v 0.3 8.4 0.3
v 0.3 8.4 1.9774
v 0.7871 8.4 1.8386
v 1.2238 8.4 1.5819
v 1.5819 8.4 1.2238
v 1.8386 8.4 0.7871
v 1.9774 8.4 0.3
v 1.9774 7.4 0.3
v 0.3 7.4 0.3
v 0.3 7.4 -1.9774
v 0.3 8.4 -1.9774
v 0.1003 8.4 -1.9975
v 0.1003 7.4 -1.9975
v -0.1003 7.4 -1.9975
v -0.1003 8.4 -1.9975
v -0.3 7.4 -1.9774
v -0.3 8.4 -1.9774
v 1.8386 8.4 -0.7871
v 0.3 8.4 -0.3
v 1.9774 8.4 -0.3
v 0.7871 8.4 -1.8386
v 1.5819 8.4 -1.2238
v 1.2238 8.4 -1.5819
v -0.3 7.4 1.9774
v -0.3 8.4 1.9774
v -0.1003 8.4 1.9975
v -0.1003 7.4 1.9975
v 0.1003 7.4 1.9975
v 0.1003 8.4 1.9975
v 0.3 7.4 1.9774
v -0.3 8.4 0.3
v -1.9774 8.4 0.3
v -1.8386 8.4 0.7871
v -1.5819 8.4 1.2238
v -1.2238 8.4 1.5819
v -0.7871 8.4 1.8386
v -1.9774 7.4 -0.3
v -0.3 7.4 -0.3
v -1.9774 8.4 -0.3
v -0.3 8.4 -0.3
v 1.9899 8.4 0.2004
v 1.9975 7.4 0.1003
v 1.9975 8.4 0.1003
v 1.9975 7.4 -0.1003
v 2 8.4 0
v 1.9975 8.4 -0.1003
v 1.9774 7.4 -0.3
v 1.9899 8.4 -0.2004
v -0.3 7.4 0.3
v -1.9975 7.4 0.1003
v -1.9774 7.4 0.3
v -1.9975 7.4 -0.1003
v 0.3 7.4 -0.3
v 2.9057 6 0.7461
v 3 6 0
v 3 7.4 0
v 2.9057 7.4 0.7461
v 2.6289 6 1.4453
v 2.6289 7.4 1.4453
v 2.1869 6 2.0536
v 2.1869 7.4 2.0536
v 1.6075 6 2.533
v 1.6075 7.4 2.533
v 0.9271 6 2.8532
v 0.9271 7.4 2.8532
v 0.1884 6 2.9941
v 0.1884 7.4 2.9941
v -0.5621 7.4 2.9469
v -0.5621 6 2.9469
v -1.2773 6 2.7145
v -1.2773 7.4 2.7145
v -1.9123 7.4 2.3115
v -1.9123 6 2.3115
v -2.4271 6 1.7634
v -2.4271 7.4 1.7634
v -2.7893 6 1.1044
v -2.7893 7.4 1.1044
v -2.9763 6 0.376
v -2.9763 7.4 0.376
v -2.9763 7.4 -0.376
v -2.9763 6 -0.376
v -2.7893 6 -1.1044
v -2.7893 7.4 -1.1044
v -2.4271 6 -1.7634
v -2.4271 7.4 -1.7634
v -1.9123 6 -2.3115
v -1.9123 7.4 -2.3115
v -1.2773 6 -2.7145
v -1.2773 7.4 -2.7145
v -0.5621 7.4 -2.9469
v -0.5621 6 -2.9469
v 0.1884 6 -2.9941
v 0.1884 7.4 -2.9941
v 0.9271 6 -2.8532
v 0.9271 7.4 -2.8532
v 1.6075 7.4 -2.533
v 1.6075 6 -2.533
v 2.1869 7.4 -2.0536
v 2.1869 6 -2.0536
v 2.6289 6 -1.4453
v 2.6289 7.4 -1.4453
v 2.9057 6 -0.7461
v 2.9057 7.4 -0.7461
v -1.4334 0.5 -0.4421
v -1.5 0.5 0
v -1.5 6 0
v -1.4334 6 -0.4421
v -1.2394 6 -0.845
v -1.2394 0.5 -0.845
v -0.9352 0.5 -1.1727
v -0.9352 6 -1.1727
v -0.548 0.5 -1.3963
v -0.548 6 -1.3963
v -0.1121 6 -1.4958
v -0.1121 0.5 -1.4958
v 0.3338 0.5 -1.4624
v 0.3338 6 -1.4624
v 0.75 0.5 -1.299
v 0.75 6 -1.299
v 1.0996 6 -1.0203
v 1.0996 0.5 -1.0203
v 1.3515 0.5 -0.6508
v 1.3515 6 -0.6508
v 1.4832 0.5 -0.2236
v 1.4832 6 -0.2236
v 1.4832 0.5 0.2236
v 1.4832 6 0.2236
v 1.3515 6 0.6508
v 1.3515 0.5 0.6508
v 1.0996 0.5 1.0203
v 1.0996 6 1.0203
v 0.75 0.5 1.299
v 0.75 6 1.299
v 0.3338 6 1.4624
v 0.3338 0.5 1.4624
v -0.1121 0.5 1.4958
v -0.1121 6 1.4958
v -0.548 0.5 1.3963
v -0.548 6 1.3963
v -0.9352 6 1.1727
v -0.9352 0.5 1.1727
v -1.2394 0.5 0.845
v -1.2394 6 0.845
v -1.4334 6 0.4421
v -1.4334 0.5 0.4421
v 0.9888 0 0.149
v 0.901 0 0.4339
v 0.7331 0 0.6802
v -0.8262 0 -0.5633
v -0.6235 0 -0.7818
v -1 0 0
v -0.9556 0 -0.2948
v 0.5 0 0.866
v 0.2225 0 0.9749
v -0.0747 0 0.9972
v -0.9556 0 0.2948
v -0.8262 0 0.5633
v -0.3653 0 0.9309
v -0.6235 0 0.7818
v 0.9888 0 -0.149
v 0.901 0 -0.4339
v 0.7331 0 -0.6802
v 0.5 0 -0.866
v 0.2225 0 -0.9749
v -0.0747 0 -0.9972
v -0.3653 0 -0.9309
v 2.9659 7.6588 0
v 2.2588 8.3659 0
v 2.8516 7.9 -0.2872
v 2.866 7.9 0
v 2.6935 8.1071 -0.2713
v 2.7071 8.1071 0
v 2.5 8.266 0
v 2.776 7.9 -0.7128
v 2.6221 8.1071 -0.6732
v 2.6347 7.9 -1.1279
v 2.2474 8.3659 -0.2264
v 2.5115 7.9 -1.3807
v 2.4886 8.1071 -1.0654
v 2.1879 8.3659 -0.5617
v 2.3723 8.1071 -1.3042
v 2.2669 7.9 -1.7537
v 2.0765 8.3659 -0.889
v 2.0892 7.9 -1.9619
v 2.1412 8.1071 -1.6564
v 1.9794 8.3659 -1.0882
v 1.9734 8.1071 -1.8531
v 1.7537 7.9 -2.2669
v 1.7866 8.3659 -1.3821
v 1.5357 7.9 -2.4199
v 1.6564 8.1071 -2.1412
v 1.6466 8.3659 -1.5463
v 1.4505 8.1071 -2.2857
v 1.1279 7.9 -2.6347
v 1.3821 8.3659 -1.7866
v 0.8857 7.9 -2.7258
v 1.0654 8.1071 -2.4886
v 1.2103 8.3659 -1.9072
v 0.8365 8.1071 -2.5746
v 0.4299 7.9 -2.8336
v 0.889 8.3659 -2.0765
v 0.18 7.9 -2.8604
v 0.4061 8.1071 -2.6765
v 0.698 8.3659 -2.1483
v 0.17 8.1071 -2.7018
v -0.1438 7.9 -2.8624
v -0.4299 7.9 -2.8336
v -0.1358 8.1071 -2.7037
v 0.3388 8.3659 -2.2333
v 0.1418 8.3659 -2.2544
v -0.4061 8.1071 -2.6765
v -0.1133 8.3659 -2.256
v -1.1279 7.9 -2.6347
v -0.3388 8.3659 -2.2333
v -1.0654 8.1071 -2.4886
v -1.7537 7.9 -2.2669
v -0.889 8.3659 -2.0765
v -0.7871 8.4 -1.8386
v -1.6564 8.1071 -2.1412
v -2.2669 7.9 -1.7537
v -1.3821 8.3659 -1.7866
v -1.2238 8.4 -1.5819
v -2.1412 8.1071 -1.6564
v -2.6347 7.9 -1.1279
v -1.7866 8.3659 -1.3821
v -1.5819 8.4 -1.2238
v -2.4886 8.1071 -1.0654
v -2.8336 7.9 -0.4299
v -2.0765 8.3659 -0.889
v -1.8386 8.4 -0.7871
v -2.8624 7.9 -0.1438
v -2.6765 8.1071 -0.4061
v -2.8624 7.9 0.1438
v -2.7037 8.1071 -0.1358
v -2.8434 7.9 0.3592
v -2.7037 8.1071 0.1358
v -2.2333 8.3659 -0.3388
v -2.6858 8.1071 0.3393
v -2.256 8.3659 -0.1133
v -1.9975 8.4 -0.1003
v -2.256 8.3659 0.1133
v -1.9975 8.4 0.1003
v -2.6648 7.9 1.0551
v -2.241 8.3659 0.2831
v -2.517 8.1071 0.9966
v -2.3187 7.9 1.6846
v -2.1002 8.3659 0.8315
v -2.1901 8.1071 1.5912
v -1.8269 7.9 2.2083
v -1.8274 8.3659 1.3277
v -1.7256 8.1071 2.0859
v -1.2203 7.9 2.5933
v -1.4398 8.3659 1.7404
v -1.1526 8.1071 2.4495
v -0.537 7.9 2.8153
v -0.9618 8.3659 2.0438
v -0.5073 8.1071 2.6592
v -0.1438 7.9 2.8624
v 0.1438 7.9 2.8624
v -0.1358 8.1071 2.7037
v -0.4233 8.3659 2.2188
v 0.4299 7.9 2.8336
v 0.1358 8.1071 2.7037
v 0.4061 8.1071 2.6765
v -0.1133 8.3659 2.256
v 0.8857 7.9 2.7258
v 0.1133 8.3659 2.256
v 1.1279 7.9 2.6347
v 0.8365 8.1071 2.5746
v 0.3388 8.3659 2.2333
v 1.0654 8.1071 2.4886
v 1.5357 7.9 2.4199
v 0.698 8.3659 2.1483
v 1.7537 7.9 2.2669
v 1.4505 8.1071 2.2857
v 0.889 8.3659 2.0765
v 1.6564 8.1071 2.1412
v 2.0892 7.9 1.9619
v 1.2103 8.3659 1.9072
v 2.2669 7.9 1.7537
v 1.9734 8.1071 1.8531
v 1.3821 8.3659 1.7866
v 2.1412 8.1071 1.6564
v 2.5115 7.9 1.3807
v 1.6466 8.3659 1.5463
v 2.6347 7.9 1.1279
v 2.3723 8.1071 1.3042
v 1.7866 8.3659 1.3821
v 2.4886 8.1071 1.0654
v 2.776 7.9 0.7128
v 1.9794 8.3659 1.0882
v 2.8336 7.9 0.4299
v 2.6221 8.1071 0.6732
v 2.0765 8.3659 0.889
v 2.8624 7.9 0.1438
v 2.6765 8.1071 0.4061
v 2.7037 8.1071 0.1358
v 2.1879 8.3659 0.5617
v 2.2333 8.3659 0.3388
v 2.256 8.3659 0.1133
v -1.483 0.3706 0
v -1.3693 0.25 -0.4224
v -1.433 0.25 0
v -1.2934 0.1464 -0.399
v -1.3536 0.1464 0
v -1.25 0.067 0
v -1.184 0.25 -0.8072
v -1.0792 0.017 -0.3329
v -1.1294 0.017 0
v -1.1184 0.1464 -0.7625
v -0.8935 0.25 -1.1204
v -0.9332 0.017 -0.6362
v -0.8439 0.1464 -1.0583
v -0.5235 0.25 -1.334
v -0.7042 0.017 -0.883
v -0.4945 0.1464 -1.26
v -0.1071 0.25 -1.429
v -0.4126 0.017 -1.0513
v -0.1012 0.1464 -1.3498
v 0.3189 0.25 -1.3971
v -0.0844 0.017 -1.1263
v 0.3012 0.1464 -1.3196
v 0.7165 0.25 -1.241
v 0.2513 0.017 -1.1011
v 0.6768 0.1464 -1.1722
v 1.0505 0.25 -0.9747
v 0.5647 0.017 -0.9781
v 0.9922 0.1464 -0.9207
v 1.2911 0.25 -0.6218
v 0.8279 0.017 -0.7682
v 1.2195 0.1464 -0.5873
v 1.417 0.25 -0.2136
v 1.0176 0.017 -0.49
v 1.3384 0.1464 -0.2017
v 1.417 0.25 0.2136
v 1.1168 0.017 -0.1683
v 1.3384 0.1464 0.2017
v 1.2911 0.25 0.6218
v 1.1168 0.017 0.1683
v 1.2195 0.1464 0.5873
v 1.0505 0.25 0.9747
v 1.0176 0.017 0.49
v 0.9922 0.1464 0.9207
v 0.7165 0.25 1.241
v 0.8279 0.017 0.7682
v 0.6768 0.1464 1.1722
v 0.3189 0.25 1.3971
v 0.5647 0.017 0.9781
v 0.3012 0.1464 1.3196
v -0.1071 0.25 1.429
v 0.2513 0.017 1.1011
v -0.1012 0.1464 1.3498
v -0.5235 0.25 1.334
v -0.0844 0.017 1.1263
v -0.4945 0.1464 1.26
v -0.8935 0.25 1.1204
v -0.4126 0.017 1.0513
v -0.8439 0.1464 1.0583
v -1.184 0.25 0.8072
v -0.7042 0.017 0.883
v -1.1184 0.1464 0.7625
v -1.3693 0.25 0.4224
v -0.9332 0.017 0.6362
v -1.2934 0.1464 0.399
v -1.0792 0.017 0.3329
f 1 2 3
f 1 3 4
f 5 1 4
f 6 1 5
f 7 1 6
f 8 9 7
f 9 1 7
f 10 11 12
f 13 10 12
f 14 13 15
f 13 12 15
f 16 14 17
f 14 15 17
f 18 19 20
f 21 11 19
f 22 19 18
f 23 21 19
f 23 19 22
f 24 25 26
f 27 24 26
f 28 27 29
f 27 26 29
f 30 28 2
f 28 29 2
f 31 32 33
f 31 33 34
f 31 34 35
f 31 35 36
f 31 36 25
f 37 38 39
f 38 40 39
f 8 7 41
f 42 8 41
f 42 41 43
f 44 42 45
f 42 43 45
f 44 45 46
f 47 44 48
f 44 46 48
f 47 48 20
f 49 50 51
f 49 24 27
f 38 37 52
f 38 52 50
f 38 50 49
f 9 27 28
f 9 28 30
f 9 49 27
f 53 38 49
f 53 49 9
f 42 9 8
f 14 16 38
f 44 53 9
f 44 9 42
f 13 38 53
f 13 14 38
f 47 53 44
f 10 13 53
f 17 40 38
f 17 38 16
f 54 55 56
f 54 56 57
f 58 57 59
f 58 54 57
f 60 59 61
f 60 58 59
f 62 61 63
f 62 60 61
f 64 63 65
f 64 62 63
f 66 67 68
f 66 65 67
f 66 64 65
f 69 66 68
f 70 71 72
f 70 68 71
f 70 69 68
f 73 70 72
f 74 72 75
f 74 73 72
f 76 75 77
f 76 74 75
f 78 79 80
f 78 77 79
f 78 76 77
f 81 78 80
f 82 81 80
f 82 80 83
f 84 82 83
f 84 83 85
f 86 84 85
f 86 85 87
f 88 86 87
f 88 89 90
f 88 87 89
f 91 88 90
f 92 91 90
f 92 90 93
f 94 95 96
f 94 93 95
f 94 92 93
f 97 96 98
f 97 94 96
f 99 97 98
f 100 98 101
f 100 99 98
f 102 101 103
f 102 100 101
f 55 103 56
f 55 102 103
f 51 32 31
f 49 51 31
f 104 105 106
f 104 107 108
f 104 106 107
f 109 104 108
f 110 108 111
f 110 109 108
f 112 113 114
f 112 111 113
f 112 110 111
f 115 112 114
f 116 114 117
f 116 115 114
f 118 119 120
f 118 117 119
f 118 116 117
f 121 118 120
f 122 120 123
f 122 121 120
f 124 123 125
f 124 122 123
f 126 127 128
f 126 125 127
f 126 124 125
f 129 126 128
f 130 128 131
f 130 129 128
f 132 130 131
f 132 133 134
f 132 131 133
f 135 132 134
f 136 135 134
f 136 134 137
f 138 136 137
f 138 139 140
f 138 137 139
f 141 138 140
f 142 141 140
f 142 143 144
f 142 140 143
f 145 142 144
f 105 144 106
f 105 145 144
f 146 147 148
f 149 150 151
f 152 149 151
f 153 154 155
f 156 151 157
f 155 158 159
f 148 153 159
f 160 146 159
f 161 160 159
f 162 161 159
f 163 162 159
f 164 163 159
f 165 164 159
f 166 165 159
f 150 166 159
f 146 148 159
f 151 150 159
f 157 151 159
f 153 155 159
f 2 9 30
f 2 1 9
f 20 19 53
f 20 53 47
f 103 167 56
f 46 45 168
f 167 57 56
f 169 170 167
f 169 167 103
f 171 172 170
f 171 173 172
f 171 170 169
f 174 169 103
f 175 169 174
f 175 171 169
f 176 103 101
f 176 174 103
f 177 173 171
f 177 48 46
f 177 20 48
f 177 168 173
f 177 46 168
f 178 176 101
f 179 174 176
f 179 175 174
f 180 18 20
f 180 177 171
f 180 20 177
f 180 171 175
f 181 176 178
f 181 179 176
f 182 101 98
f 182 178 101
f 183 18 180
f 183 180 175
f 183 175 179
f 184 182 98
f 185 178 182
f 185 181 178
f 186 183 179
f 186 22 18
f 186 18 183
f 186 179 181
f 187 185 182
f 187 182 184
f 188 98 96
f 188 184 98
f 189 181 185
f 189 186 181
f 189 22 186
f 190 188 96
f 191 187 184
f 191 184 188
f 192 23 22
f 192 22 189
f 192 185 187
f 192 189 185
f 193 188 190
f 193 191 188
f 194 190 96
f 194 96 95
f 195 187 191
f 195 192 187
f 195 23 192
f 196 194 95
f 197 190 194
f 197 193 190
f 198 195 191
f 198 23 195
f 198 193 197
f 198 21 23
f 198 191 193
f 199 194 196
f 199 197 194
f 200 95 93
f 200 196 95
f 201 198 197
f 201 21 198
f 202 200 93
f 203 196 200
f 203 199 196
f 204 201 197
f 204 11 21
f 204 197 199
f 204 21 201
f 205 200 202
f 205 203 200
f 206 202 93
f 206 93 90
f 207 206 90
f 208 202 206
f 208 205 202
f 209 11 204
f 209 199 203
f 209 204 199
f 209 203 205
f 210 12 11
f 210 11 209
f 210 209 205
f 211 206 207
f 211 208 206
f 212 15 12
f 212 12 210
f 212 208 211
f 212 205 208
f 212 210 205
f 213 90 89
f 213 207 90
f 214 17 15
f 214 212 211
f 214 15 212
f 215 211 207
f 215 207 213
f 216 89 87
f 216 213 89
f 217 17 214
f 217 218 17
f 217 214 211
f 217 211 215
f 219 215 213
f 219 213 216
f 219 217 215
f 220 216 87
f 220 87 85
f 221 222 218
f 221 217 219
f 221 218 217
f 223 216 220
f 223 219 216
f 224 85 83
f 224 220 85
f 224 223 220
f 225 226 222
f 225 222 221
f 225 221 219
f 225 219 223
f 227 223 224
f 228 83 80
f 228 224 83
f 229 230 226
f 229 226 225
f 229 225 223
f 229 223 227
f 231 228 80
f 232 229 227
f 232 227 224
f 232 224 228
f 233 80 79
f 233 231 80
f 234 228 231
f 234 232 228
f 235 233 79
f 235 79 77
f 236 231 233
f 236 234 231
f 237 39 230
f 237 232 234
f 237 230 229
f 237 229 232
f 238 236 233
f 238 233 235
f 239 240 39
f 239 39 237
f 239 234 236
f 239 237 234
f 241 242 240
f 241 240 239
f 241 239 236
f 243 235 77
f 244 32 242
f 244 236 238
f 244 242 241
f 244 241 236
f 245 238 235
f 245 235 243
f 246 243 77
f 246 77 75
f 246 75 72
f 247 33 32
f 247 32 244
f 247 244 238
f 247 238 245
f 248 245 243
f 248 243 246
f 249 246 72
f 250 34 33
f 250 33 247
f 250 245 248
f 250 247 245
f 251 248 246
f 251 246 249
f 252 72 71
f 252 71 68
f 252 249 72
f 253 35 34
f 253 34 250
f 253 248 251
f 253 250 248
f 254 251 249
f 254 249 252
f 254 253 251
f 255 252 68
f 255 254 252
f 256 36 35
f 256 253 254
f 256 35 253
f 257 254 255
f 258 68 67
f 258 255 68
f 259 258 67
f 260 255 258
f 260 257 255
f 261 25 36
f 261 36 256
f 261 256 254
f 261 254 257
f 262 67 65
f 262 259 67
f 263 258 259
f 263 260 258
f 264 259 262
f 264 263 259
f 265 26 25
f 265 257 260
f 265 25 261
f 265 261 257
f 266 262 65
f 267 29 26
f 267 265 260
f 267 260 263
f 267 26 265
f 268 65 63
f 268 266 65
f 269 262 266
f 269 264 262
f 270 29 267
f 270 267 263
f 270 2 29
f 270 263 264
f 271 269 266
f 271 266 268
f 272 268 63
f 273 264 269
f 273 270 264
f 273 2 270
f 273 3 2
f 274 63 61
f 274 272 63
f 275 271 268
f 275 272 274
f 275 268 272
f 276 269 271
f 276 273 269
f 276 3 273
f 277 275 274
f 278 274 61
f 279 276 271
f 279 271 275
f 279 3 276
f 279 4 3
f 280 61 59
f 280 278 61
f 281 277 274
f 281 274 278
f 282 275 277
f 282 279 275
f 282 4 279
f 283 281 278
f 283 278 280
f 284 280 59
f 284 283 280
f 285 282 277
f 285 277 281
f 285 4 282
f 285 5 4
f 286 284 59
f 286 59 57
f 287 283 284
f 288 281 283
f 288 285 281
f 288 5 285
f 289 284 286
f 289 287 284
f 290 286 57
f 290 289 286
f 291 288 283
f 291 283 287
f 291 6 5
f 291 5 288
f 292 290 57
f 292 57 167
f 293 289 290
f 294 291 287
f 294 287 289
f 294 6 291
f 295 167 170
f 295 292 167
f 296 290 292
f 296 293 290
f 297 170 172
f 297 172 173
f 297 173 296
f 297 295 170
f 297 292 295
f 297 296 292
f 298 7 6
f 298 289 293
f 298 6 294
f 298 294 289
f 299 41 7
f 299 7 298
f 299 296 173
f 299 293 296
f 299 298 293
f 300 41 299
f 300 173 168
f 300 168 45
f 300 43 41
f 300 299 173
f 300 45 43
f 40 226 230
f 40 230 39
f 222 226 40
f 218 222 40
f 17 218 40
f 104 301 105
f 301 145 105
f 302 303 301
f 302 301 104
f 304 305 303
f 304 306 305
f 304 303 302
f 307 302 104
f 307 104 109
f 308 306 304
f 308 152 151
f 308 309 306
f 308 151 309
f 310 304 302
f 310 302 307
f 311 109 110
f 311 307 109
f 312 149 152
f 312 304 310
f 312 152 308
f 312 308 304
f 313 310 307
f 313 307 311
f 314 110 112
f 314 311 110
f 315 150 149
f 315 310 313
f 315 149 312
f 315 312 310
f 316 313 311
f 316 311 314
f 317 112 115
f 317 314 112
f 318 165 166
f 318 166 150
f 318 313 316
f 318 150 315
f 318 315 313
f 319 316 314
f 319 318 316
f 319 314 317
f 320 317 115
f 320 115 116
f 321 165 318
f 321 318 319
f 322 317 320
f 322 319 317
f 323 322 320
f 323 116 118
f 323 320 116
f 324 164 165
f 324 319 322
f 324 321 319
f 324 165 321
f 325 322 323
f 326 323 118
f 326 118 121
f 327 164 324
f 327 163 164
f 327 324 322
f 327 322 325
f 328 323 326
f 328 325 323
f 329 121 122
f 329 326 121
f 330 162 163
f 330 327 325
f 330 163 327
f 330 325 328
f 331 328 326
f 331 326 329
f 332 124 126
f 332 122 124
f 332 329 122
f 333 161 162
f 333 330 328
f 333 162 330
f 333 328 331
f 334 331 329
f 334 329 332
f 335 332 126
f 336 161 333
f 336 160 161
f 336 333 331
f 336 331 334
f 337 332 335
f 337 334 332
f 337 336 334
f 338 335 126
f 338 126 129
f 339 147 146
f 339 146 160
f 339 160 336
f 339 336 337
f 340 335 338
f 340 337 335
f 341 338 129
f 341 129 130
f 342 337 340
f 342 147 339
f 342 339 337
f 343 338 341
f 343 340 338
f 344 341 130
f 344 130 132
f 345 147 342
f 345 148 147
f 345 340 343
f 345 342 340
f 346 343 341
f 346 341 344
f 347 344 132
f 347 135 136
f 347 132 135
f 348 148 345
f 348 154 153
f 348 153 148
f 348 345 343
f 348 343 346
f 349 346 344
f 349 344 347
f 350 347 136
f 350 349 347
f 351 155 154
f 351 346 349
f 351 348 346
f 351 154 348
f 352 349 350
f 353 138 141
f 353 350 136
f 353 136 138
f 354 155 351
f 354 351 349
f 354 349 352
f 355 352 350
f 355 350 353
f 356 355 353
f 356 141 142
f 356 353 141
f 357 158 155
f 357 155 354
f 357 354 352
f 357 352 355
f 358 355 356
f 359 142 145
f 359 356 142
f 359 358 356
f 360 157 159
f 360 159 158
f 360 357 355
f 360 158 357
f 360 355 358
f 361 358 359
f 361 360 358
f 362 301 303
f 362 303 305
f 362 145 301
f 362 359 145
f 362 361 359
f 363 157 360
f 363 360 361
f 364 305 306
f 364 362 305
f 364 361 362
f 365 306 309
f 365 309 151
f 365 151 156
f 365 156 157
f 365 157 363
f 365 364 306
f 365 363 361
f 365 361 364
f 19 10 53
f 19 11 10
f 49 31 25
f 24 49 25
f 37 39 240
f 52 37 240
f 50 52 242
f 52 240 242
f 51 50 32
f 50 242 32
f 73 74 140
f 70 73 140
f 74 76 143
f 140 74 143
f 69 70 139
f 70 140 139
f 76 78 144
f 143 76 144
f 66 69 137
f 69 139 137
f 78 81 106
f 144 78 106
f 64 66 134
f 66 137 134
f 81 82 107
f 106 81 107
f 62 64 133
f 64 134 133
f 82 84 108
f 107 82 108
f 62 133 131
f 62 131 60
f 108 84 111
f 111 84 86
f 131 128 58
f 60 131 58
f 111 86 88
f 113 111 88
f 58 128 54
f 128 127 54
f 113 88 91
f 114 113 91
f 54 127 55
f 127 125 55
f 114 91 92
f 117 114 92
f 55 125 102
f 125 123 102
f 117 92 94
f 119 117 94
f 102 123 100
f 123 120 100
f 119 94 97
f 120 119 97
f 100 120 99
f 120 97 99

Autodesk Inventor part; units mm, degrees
ref_plane "YZ Plane" through (0, 0, 0) normal (1, 0, 0) x (0, 1, 0)
ref_plane "XZ Plane" through (0, 0, 0) normal (0, 1, 0) x (-1, 0, 0)
ref_plane "XY Plane" through (0, 0, 0) normal (0, 0, 1) x (1, 0, 0)
sketch "Sketch1" plane through (0, 0, 0) normal (0, 1, 0) x (-1, 0, 0)
  circle A0 centre (0, 0) radius 1.5
  dimension "d0" = 3
extrude "Extrusion1" add sketch "Sketch1" along normal blind 6
sketch "Sketch2" plane through (0, 6, 0) normal (0, 1, 0) x (1, 0, 0)
  circle A0 centre (0, 0) radius 1.5 projected
  circle A1 centre (0, 0) radius 3
  dimension "d3" = 6
extrude "Extrusion2" add sketch "Sketch2" along normal blind 2.4 contours A0 | A1
fillet "Fillet4" radius 0.5 1 edges at (1.5, 0, 0)
thread "Thread2" size "M3x0.5" class "6g" standard "ANSI Metric M Profile" full length
fillet "Fillet5" radius 1 1 edges at (-3, 8.4, 0)
sketch "Sketch5" plane through (0, 8.4, 0) normal (0, 1, 0) x (1, 0, 0)
  circle A0 centre (0, 0) radius 2 projected
  line L0 (-0.3, 0) -> (-0.3, 1.9774)
  line L1 (0.3, 1.9774) -> (0.3, -1.9774)
  line L2 (-0.3, 1.9774) -> (-0.3, -1.9774)
  line L3 (0, 0.3) -> (-1.9774, 0.3)
  line L4 (-1.9774, 0.3) -> (1.9774, 0.3)
  line L5 (-1.9774, -0.3) -> (1.9774, -0.3)
  dimension "d32" = 0.3
  dimension "d33" = 0.3
  dimension "d35" = 0.3
  dimension "d36" = 0.3
extrude "Extrusion4" cut sketch "Sketch5" against normal blind 1 contours A0 L5 L1 L4 | L1 L4 L3 L0 A0 | L1 L5 L2 L0 L3 L4 | A0 L2 L5 L1 | L5 A0 L3 L0 L2
properties part number "M3x6"
